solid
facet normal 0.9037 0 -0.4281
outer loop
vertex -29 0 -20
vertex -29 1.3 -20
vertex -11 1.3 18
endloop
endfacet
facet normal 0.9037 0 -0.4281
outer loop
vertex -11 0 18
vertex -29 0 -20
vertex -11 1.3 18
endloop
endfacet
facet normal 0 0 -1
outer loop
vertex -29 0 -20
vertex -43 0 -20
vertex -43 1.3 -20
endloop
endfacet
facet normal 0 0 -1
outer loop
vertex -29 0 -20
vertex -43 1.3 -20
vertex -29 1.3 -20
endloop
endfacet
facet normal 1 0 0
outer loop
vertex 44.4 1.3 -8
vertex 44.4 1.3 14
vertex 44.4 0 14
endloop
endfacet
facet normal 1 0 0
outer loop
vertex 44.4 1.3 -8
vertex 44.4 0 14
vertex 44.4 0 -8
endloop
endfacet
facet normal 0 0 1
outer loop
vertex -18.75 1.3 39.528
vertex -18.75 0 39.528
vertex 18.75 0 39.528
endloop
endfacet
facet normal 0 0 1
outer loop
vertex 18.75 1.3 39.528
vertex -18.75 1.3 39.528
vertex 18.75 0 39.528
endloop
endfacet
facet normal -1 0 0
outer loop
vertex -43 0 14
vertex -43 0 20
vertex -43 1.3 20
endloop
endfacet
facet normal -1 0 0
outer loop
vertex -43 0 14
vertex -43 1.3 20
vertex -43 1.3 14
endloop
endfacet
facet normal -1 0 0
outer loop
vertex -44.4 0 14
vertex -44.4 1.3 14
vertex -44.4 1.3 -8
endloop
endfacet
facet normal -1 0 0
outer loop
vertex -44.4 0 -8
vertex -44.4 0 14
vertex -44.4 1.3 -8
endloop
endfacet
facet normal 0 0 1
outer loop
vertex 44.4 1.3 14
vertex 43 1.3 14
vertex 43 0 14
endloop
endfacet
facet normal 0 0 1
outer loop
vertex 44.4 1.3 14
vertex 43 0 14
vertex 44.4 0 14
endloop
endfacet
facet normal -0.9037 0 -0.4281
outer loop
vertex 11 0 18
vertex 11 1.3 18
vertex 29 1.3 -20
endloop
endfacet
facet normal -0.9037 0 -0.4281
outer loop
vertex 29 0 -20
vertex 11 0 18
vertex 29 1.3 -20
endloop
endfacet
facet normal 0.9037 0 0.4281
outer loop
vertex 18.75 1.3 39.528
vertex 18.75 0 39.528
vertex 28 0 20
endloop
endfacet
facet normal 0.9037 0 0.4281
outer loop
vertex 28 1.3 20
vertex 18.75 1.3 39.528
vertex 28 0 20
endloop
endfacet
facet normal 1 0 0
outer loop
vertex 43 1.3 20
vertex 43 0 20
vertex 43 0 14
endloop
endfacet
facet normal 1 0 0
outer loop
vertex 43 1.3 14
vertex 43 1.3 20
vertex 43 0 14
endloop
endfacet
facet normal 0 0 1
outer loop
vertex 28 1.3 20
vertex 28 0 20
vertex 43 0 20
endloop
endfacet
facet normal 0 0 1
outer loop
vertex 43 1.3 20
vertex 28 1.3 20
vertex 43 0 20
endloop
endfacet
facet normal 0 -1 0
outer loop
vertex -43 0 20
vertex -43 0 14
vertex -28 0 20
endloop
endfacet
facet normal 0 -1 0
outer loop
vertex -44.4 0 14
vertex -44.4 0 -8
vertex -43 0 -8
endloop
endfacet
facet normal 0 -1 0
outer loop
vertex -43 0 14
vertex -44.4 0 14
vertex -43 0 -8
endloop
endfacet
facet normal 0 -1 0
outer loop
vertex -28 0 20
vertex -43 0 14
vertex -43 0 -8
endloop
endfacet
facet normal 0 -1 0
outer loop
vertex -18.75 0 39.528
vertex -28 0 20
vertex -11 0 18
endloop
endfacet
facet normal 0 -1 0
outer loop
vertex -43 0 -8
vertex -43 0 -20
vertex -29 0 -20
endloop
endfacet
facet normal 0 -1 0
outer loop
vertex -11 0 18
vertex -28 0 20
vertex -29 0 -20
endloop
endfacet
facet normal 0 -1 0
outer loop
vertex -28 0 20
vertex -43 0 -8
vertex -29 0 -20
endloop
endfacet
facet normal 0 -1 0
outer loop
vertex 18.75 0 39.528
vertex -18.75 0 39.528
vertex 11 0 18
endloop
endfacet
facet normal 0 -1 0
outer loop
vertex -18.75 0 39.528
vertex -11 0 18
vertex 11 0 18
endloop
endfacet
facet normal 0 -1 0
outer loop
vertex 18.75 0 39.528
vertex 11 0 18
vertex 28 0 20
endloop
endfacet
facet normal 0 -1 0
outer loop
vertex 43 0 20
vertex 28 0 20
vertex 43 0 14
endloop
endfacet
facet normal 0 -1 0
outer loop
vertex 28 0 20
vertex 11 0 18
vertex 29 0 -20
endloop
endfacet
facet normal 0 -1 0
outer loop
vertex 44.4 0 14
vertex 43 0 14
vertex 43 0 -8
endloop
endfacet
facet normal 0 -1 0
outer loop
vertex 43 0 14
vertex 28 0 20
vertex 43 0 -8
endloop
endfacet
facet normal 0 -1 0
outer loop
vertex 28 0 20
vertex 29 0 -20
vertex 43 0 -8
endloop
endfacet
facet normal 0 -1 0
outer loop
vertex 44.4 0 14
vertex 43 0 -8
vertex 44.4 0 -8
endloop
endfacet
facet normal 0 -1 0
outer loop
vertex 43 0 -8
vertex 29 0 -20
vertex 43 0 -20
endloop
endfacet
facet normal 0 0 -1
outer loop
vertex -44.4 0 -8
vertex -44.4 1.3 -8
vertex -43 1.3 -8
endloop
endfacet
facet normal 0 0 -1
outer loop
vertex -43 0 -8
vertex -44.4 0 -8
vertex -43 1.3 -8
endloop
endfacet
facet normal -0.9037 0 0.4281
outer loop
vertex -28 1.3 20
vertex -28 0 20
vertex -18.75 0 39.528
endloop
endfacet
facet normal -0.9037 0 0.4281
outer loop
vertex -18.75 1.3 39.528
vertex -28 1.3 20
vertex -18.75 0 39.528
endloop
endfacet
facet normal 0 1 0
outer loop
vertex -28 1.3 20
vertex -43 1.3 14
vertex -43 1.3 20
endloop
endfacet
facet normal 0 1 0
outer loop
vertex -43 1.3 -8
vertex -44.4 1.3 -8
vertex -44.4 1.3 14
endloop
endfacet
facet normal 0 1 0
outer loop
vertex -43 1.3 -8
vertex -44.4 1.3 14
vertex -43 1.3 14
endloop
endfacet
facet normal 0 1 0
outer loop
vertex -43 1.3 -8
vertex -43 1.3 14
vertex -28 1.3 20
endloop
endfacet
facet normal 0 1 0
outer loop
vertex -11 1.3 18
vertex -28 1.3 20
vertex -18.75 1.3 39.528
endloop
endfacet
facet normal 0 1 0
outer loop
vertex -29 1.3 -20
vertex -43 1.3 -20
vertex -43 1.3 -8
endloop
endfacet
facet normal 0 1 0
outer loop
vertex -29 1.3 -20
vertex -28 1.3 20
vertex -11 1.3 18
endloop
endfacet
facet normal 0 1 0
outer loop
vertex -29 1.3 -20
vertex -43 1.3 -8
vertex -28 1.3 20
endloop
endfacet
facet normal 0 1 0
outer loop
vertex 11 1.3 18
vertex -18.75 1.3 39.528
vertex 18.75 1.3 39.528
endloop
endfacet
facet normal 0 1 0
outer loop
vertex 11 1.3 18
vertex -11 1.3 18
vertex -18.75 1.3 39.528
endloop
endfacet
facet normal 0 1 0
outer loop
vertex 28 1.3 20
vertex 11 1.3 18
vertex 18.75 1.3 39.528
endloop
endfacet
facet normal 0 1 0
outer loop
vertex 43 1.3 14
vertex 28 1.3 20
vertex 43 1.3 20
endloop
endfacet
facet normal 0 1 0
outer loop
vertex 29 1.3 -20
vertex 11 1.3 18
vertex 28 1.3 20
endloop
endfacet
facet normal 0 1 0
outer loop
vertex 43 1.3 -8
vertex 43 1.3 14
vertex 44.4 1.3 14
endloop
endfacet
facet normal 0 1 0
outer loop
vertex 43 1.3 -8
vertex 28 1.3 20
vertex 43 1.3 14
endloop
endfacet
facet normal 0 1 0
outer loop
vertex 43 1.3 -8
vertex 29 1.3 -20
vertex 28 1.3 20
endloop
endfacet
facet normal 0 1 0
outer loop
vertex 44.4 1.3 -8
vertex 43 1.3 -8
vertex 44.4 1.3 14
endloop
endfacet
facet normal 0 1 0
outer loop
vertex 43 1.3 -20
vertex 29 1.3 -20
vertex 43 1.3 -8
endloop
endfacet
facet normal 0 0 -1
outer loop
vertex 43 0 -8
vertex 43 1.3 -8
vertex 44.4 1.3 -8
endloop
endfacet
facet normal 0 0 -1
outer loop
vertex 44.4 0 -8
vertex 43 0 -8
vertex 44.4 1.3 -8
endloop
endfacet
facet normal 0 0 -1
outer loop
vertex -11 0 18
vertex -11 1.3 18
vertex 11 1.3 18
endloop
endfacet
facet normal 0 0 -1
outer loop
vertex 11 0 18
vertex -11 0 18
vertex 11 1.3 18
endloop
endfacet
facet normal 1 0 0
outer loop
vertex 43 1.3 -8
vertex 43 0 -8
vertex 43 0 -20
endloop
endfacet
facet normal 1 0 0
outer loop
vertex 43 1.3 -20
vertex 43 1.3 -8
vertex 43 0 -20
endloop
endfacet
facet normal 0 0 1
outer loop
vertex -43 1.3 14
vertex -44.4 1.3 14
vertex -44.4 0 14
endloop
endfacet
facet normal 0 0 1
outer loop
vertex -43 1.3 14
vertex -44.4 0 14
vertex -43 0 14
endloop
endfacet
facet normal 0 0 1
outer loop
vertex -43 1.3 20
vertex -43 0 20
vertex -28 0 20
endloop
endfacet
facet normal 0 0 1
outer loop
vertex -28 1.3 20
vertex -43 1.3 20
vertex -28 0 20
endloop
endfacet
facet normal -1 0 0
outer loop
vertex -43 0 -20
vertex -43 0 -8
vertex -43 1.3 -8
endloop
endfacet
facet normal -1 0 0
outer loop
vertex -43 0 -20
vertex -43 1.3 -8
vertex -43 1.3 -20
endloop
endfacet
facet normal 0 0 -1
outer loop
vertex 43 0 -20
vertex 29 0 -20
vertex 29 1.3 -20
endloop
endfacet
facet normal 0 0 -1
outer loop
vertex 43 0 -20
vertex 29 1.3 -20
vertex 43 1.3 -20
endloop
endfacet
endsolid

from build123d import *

# Parameters (mm, degrees)
SKETCH1_W           = 86
SKETCH1_H           = 40
BOSS_EXTRUDE1_DEPTH = 1.3
SKETCH2_W           = 1.4
SKETCH2_H           = 22
BOSS_EXTRUDE2_DEPTH = 1.3
CUT_EXTRUDE1_DEPTH  = 49.713961038
BOSS_EXTRUDE3_DEPTH = 1.3


with BuildPart() as part:
    # Sketch1 → Boss-Extrude1 (new body)
    with BuildSketch(Plane(origin=(0, 0, 0), x_dir=(1, 0, 0), z_dir=(0, 1, 0))):
        Rectangle(SKETCH1_W, SKETCH1_H)
    extrude(amount=BOSS_EXTRUDE1_DEPTH)

    # Sketch2 → Boss-Extrude2 (add)
    with BuildSketch(Plane(origin=(0, 1.3, 0), x_dir=(1, 0, 0), z_dir=(0, 1, 0))):
        with Locations((-43.7, -3)):
            Rectangle(SKETCH2_W, SKETCH2_H)
        with Locations((43.7, -3)):
            Rectangle(SKETCH2_W, SKETCH2_H)
    extrude(amount=-BOSS_EXTRUDE2_DEPTH)

    # Sketch3 → Cut-Extrude1 (cut, through all)
    with BuildSketch(Plane(origin=(0, 1.3, 0), x_dir=(1, 0, 0), z_dir=(0, 1, 0))):
        Polygon((29, 20), (-29, 20), (-11, -18), (11, -18), align=None)
    extrude(amount=-CUT_EXTRUDE1_DEPTH, mode=Mode.SUBTRACT)

    # Sketch4 → Boss-Extrude3 (add)
    with BuildSketch(Plane(origin=(0, 0, 0), x_dir=(1, 0, 0), z_dir=(0, 1, 0))):
        Polygon((-28, -20), (-18.75, -39.527777778), (18.75, -39.527777778), (28, -20), align=None)
    extrude(amount=BOSS_EXTRUDE3_DEPTH)


solid = part.part
